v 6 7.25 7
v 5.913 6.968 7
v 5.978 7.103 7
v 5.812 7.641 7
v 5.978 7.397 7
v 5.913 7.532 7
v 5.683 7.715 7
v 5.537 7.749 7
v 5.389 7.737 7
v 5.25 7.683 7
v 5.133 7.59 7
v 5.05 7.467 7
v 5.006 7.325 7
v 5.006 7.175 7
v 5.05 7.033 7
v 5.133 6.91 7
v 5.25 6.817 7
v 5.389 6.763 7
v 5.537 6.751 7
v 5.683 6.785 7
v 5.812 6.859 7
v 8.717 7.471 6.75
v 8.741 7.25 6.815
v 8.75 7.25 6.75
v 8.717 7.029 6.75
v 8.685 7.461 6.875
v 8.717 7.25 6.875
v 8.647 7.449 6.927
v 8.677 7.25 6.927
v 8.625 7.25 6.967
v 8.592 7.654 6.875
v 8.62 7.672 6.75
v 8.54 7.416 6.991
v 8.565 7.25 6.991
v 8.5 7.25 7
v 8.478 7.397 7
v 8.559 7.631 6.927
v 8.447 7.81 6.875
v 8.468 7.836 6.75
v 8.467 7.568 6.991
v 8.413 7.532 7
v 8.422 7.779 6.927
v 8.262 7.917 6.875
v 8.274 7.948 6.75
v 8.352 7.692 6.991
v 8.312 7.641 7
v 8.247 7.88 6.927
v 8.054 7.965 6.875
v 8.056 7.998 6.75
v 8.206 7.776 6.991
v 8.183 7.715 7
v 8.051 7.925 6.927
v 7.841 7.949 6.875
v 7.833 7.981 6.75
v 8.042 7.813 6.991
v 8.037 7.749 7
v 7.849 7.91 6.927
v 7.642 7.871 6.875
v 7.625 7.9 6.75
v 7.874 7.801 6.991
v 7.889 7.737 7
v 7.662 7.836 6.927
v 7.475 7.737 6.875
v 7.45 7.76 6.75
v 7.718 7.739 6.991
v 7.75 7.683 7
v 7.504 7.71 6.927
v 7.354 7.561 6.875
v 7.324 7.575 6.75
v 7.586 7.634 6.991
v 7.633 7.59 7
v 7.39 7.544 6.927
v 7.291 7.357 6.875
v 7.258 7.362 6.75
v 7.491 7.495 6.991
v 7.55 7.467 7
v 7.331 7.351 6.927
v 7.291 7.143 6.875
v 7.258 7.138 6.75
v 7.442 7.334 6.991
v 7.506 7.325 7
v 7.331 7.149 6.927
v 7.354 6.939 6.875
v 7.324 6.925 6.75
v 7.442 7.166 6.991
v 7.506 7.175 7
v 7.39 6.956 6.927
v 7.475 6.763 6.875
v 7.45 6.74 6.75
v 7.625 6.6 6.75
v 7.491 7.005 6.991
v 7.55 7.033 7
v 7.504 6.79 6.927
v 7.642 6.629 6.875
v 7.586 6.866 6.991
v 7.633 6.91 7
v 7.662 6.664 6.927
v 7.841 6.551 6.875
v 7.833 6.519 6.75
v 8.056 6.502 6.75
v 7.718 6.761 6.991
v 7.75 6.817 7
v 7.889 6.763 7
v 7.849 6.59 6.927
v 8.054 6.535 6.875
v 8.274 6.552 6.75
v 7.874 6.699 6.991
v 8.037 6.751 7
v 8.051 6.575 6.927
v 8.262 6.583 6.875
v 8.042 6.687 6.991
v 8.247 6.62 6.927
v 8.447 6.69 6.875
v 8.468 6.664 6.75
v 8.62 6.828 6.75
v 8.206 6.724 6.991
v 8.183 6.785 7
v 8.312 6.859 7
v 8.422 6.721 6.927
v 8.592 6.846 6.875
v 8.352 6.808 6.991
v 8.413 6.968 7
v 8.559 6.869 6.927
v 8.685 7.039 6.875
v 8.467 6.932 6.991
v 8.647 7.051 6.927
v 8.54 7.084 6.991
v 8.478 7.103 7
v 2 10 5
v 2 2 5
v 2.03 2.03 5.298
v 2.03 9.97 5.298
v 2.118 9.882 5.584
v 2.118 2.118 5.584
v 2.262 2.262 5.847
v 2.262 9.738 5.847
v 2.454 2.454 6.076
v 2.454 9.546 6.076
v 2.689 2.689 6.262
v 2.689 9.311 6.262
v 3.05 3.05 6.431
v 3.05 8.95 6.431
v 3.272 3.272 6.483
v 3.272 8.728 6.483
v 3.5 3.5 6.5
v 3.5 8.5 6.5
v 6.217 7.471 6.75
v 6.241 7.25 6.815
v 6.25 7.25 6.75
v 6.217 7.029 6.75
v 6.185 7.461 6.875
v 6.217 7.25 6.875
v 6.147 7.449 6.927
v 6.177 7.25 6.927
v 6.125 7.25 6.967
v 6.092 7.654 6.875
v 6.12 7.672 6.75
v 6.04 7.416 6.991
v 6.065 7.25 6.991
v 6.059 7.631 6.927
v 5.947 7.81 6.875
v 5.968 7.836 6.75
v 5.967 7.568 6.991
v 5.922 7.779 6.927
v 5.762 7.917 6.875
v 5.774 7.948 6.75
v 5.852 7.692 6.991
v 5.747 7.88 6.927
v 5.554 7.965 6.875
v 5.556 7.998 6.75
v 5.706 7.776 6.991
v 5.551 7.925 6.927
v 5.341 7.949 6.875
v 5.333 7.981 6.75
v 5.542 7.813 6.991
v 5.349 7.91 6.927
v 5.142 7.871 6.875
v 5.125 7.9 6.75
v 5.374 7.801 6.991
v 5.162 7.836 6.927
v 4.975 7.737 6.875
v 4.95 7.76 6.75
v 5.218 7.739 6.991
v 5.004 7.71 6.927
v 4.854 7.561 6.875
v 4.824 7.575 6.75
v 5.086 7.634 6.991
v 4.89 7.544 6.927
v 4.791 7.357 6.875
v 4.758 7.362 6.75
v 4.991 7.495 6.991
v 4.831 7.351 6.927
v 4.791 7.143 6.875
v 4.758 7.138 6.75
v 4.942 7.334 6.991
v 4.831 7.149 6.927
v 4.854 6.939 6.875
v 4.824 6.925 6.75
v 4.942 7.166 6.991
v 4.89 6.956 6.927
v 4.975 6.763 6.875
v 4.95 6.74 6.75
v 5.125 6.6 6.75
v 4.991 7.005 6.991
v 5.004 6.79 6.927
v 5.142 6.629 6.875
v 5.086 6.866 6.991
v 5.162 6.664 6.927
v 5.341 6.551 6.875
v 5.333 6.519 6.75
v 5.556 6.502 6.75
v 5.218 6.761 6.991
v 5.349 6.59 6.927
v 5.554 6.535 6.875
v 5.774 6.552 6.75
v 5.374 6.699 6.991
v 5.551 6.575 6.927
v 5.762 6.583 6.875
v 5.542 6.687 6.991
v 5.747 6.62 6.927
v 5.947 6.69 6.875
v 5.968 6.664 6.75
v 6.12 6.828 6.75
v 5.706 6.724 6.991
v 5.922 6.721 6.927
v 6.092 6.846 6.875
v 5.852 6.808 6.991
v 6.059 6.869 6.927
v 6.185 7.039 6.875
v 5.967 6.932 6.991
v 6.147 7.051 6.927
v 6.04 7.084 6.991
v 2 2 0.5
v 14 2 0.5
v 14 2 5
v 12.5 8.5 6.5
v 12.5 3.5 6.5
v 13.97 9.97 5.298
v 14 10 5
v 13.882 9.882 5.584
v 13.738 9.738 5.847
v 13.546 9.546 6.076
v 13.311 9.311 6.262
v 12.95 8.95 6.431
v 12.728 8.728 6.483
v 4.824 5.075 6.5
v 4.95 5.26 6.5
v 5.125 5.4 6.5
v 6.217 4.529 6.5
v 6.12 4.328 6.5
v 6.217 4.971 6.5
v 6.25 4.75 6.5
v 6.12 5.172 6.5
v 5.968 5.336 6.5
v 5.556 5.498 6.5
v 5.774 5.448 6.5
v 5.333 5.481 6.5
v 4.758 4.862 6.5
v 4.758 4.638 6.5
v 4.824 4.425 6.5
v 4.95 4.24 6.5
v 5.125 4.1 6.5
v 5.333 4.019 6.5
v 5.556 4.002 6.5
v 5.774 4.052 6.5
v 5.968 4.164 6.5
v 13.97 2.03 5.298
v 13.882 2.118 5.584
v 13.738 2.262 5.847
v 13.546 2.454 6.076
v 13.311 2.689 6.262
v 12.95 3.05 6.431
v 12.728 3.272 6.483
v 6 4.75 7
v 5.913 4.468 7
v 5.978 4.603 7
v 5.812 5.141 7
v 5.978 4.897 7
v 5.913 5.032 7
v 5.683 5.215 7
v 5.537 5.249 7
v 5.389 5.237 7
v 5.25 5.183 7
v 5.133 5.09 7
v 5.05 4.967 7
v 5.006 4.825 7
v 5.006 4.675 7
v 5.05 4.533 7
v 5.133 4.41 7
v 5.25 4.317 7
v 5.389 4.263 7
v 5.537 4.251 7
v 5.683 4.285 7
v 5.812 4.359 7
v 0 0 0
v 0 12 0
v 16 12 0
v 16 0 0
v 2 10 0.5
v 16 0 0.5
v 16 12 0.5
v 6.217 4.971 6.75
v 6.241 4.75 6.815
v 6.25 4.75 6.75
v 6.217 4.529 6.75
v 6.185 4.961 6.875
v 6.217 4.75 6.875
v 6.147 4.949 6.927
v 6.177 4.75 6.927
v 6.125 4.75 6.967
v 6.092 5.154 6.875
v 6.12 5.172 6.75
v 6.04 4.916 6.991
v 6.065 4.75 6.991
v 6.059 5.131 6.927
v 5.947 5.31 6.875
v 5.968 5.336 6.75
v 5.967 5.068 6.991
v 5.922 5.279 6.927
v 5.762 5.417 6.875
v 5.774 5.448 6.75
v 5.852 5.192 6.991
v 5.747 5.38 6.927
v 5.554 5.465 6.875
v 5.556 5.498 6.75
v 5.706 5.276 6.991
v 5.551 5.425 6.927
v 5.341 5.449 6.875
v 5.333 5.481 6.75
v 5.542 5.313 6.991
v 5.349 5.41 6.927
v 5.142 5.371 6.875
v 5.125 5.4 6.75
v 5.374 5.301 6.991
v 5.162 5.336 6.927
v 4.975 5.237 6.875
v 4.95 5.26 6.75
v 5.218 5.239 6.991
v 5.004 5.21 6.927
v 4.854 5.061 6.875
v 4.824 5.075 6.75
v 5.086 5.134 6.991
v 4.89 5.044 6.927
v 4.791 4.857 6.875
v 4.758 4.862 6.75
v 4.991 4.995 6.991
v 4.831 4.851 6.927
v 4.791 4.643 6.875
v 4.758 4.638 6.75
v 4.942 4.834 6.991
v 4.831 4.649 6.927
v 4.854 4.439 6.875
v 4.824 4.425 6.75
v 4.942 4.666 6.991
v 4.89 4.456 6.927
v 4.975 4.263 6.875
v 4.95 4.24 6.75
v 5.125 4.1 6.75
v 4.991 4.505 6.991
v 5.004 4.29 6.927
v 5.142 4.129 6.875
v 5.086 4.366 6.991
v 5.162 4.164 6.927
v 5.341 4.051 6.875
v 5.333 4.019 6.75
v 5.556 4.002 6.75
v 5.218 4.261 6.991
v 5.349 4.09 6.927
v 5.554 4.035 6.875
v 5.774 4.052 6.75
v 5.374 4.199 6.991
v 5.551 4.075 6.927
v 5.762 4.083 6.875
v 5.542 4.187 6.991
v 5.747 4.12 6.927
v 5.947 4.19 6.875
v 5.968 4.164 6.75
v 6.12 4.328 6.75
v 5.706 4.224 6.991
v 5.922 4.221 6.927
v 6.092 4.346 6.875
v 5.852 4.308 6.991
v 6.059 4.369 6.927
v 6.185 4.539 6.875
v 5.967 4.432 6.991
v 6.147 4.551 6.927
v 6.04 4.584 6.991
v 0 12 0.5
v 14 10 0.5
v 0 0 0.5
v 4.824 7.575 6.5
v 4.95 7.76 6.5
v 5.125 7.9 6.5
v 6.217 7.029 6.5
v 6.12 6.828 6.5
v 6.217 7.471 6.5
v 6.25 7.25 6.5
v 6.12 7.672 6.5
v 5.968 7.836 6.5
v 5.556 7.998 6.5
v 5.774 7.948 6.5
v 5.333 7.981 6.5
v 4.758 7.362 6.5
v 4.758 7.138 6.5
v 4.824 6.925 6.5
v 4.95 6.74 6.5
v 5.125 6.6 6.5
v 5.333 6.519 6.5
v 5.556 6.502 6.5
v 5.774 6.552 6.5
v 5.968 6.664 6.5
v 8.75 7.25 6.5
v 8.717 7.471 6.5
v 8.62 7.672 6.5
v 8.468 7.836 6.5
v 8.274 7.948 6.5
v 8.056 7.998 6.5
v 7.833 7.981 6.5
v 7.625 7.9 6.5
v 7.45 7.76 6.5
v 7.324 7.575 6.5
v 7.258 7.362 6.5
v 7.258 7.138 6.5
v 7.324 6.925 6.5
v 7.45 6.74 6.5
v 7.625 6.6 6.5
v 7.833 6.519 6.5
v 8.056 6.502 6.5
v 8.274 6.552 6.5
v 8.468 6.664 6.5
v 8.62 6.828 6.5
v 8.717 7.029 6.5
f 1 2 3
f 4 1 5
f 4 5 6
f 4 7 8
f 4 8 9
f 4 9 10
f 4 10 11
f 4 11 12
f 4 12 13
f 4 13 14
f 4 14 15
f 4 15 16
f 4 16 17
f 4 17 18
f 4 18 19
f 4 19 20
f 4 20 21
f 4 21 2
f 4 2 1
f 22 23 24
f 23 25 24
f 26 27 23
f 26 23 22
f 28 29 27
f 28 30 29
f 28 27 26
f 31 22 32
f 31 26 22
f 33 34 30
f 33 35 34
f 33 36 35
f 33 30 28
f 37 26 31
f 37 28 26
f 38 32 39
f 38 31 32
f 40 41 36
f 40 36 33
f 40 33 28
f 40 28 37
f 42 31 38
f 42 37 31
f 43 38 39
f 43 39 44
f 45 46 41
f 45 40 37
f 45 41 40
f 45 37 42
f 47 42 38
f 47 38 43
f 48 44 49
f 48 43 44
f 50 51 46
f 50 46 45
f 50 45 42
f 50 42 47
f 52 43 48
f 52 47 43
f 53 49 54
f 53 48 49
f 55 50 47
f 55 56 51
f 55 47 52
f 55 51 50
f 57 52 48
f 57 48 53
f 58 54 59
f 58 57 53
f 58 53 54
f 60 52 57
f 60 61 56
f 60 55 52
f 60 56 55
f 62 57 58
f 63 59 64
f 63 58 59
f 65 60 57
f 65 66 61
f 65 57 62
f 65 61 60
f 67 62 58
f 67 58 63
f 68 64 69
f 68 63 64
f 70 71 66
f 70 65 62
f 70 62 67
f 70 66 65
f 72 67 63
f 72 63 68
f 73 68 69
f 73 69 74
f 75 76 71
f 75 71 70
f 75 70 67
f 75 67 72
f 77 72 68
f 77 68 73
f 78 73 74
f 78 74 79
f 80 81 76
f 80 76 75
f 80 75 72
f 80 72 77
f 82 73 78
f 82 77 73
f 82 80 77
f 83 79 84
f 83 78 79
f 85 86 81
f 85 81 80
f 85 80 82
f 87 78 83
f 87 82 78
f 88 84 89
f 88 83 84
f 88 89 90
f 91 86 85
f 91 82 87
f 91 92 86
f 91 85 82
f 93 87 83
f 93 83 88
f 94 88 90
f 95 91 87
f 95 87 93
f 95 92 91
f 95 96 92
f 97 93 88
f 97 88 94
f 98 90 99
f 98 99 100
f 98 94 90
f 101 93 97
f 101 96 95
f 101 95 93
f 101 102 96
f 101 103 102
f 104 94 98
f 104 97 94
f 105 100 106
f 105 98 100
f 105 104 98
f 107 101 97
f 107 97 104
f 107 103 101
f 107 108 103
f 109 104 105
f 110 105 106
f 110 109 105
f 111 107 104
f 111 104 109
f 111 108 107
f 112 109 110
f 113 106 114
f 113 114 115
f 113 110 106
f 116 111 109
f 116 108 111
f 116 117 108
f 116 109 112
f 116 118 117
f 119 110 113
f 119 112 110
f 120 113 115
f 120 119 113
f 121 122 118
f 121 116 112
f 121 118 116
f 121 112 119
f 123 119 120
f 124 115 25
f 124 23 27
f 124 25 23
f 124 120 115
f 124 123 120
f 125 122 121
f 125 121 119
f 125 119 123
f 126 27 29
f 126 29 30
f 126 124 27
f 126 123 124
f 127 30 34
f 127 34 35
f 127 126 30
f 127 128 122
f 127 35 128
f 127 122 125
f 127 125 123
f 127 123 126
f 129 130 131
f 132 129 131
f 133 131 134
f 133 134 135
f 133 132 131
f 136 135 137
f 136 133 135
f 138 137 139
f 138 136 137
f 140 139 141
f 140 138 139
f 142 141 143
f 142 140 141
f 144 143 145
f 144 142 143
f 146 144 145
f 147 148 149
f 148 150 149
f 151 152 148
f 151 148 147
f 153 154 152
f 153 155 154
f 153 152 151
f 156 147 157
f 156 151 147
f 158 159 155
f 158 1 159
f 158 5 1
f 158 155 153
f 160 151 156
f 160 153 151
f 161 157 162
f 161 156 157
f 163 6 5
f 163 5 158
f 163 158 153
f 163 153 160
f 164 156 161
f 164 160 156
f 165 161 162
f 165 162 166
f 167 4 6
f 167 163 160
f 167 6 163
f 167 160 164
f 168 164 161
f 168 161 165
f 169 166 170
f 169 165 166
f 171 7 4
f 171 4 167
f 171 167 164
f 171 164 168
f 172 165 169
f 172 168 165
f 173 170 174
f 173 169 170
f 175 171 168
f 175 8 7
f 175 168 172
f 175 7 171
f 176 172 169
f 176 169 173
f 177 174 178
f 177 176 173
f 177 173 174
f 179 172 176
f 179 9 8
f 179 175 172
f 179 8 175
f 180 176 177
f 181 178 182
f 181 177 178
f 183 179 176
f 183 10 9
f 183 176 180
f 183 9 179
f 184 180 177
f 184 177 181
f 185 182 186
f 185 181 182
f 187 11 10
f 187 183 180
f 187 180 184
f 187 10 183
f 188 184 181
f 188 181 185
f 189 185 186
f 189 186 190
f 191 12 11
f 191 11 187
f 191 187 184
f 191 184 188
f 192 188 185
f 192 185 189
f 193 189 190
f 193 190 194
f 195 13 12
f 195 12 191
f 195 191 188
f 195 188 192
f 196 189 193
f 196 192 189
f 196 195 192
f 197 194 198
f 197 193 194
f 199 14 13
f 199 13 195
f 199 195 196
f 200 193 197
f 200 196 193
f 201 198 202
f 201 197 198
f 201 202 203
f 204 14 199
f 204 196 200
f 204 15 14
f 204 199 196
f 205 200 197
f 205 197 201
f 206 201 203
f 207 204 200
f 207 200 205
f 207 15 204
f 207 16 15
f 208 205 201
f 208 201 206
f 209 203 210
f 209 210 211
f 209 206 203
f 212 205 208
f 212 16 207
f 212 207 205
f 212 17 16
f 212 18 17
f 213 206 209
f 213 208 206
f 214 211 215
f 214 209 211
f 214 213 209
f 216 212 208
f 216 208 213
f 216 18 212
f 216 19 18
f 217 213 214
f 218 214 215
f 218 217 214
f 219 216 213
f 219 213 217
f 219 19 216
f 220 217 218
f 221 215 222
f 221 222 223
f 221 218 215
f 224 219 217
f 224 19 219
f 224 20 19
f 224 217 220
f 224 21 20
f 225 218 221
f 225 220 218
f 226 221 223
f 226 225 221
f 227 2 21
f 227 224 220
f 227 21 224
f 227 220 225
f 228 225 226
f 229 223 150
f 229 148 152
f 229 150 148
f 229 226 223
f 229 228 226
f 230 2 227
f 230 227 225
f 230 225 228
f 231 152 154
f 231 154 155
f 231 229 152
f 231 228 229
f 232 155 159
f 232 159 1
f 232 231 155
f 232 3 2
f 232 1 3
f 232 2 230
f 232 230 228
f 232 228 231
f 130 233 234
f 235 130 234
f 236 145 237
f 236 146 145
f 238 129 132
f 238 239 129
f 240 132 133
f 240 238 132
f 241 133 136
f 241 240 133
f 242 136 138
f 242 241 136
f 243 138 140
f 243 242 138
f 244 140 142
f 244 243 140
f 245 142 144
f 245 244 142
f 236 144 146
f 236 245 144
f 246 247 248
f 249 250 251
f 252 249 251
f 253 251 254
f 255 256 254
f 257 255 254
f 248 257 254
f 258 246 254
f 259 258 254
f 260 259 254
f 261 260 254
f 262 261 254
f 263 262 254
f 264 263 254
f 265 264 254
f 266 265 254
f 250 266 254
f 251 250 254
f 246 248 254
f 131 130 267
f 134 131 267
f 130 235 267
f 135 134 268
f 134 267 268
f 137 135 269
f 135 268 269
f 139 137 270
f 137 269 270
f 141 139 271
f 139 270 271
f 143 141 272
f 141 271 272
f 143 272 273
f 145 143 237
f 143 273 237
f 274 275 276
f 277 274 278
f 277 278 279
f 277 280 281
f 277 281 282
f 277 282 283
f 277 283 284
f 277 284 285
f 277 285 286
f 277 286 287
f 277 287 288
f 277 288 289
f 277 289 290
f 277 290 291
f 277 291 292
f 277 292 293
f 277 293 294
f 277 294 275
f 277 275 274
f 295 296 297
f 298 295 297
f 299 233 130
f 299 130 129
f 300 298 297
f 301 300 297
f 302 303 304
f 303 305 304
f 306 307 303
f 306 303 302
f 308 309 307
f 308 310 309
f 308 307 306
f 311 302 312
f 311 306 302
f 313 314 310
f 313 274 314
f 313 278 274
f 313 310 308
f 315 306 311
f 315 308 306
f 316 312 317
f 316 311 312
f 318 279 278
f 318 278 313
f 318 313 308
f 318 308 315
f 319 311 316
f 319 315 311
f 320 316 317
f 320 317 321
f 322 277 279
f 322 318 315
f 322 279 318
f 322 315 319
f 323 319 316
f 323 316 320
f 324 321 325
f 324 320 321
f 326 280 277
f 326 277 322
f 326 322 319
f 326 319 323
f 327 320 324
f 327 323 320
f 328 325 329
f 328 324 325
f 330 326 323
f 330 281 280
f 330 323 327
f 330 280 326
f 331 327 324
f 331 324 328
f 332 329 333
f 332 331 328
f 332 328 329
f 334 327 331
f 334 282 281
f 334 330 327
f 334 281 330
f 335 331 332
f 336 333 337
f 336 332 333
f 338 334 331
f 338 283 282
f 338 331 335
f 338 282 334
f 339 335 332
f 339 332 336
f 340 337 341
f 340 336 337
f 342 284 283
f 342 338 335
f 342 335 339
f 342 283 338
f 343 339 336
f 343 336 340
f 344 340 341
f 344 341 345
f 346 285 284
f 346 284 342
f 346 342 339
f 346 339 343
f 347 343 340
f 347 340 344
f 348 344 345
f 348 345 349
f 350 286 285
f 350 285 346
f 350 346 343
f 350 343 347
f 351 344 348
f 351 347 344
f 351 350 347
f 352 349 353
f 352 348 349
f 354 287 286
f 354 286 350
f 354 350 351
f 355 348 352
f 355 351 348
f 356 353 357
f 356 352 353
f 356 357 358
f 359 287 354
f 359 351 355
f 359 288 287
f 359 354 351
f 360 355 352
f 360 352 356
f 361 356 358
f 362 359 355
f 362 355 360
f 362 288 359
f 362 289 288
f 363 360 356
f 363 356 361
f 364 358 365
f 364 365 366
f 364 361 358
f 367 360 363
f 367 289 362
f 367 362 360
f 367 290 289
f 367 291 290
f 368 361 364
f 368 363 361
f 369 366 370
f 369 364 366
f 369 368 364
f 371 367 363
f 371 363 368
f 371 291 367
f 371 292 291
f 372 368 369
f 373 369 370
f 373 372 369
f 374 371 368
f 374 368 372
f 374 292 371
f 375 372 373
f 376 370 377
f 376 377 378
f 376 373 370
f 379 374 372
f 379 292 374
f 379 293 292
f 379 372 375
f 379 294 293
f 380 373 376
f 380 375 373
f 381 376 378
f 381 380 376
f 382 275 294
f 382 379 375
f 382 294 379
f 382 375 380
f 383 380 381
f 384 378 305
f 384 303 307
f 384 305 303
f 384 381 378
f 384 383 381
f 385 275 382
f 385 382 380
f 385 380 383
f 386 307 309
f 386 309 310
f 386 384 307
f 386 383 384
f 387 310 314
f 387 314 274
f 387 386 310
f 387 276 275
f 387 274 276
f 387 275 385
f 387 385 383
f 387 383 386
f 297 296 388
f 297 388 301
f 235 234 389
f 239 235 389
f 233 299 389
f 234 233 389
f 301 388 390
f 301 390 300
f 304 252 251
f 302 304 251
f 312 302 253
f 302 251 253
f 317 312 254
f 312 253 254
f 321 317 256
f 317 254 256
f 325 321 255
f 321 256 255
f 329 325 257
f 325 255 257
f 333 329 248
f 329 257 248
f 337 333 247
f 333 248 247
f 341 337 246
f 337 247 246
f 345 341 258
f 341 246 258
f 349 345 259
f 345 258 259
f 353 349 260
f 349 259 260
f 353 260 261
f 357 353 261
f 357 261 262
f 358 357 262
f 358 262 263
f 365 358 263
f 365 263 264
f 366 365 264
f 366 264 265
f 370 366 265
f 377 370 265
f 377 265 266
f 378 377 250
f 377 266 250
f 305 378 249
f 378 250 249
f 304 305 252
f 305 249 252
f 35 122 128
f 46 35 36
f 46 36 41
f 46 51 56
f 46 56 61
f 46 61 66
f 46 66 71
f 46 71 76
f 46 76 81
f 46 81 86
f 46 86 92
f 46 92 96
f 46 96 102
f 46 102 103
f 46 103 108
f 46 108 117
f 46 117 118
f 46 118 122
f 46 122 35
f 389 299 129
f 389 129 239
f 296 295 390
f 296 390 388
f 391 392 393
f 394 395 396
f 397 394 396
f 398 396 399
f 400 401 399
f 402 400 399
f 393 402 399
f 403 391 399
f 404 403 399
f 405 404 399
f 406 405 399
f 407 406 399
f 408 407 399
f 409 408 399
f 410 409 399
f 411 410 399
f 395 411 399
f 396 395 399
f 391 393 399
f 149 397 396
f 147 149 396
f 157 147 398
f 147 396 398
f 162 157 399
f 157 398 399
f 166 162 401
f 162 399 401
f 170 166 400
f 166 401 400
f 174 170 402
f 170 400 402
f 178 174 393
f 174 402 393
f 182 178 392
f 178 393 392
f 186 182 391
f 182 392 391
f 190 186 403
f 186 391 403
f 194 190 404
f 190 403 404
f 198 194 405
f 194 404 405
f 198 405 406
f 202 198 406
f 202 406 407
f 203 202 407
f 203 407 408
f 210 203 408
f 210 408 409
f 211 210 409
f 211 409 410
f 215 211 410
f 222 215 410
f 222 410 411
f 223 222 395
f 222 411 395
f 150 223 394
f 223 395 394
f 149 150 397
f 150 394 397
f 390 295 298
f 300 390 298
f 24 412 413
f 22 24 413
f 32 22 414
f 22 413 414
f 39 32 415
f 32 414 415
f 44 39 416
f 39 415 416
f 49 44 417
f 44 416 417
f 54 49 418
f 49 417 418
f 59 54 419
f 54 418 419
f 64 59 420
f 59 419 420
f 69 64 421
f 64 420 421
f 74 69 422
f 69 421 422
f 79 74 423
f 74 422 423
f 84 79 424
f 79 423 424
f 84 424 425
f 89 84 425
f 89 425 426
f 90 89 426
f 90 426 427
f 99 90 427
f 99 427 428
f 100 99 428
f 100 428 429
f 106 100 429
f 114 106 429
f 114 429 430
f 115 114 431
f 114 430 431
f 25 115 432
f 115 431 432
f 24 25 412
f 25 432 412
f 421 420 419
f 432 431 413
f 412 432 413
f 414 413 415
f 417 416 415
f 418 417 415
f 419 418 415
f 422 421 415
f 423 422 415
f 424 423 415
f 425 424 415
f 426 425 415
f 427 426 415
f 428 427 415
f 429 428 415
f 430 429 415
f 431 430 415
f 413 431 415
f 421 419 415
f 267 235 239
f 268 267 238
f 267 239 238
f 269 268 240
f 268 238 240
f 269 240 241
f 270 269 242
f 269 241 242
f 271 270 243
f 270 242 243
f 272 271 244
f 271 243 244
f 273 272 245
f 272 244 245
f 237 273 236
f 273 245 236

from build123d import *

# Parameters (mm, degrees)
SKETCH_W     = 16
SKETCH_H     = 12
PAD_DEPTH    = 0.5
SKETCH001_W  = 12
SKETCH001_H  = 8
PAD001_DEPTH = 6
FILLET_R     = 1.5
SKETCH002_R  = 0.75
PAD002_DEPTH = 0.5
FILLET001_R  = 0.25
SKETCH004_R  = 0.75
PAD004_DEPTH = 0.5
FILLET003_R  = 0.25
SKETCH005_R  = 0.75
PAD005_DEPTH = 0.5
FILLET004_R  = 0.25


with BuildPart() as pad:
    # Sketch → Pad (new body)
    with BuildSketch(Plane.XY):
        with Locations((8, 6)):
            Rectangle(SKETCH_W, SKETCH_H)
    extrude(amount=PAD_DEPTH)


with BuildPart() as fillet_body:
    # Sketch001 → Pad001 (new body)
    with BuildSketch(Plane.XY.offset(0.5)):
        with Locations((8, 6)):
            Rectangle(SKETCH001_W, SKETCH001_H)
    extrude(amount=PAD001_DEPTH)

    # Fillet
    fillet_edges = [fillet_body.edges().sort_by_distance(p)[0] for p in [
        (8, 2, 6.5),
        (14, 6, 6.5),
        (8, 10, 6.5),
        (2, 6, 6.5),
    ]]
    fillet(fillet_edges, radius=FILLET_R)


with BuildPart() as fillet001:
    # Sketch002 → Pad002 (new body)
    with BuildSketch(Plane.XY.offset(6.5)):
        with Locations((5.5, 4.75)):
            Circle(SKETCH002_R)
    extrude(amount=PAD002_DEPTH)

    # Fillet001
    fillet001_edges = [fillet001.edges().sort_by_distance(p)[0] for p in [
        (4.75, 4.75, 7),
    ]]
    fillet(fillet001_edges, radius=FILLET001_R)


with BuildPart() as fillet003:
    # Sketch004 → Pad004 (new body)
    with BuildSketch(Plane.XY.offset(6.5)):
        with Locations((5.5, 7.25)):
            Circle(SKETCH004_R)
    extrude(amount=PAD004_DEPTH)

    # Fillet003
    fillet003_edges = [fillet003.edges().sort_by_distance(p)[0] for p in [
        (4.75, 7.25, 7),
    ]]
    fillet(fillet003_edges, radius=FILLET003_R)


with BuildPart() as fillet004:
    # Sketch005 → Pad005 (new body)
    with BuildSketch(Plane.XY.offset(6.5)):
        with Locations((8, 7.25)):
            Circle(SKETCH005_R)
    extrude(amount=PAD005_DEPTH)

    # Fillet004
    fillet004_edges = [fillet004.edges().sort_by_distance(p)[0] for p in [
        (7.25, 7.25, 7),
    ]]
    fillet(fillet004_edges, radius=FILLET004_R)


solid = Compound([pad.part, fillet_body.part, fillet001.part, fillet003.part, fillet004.part])
